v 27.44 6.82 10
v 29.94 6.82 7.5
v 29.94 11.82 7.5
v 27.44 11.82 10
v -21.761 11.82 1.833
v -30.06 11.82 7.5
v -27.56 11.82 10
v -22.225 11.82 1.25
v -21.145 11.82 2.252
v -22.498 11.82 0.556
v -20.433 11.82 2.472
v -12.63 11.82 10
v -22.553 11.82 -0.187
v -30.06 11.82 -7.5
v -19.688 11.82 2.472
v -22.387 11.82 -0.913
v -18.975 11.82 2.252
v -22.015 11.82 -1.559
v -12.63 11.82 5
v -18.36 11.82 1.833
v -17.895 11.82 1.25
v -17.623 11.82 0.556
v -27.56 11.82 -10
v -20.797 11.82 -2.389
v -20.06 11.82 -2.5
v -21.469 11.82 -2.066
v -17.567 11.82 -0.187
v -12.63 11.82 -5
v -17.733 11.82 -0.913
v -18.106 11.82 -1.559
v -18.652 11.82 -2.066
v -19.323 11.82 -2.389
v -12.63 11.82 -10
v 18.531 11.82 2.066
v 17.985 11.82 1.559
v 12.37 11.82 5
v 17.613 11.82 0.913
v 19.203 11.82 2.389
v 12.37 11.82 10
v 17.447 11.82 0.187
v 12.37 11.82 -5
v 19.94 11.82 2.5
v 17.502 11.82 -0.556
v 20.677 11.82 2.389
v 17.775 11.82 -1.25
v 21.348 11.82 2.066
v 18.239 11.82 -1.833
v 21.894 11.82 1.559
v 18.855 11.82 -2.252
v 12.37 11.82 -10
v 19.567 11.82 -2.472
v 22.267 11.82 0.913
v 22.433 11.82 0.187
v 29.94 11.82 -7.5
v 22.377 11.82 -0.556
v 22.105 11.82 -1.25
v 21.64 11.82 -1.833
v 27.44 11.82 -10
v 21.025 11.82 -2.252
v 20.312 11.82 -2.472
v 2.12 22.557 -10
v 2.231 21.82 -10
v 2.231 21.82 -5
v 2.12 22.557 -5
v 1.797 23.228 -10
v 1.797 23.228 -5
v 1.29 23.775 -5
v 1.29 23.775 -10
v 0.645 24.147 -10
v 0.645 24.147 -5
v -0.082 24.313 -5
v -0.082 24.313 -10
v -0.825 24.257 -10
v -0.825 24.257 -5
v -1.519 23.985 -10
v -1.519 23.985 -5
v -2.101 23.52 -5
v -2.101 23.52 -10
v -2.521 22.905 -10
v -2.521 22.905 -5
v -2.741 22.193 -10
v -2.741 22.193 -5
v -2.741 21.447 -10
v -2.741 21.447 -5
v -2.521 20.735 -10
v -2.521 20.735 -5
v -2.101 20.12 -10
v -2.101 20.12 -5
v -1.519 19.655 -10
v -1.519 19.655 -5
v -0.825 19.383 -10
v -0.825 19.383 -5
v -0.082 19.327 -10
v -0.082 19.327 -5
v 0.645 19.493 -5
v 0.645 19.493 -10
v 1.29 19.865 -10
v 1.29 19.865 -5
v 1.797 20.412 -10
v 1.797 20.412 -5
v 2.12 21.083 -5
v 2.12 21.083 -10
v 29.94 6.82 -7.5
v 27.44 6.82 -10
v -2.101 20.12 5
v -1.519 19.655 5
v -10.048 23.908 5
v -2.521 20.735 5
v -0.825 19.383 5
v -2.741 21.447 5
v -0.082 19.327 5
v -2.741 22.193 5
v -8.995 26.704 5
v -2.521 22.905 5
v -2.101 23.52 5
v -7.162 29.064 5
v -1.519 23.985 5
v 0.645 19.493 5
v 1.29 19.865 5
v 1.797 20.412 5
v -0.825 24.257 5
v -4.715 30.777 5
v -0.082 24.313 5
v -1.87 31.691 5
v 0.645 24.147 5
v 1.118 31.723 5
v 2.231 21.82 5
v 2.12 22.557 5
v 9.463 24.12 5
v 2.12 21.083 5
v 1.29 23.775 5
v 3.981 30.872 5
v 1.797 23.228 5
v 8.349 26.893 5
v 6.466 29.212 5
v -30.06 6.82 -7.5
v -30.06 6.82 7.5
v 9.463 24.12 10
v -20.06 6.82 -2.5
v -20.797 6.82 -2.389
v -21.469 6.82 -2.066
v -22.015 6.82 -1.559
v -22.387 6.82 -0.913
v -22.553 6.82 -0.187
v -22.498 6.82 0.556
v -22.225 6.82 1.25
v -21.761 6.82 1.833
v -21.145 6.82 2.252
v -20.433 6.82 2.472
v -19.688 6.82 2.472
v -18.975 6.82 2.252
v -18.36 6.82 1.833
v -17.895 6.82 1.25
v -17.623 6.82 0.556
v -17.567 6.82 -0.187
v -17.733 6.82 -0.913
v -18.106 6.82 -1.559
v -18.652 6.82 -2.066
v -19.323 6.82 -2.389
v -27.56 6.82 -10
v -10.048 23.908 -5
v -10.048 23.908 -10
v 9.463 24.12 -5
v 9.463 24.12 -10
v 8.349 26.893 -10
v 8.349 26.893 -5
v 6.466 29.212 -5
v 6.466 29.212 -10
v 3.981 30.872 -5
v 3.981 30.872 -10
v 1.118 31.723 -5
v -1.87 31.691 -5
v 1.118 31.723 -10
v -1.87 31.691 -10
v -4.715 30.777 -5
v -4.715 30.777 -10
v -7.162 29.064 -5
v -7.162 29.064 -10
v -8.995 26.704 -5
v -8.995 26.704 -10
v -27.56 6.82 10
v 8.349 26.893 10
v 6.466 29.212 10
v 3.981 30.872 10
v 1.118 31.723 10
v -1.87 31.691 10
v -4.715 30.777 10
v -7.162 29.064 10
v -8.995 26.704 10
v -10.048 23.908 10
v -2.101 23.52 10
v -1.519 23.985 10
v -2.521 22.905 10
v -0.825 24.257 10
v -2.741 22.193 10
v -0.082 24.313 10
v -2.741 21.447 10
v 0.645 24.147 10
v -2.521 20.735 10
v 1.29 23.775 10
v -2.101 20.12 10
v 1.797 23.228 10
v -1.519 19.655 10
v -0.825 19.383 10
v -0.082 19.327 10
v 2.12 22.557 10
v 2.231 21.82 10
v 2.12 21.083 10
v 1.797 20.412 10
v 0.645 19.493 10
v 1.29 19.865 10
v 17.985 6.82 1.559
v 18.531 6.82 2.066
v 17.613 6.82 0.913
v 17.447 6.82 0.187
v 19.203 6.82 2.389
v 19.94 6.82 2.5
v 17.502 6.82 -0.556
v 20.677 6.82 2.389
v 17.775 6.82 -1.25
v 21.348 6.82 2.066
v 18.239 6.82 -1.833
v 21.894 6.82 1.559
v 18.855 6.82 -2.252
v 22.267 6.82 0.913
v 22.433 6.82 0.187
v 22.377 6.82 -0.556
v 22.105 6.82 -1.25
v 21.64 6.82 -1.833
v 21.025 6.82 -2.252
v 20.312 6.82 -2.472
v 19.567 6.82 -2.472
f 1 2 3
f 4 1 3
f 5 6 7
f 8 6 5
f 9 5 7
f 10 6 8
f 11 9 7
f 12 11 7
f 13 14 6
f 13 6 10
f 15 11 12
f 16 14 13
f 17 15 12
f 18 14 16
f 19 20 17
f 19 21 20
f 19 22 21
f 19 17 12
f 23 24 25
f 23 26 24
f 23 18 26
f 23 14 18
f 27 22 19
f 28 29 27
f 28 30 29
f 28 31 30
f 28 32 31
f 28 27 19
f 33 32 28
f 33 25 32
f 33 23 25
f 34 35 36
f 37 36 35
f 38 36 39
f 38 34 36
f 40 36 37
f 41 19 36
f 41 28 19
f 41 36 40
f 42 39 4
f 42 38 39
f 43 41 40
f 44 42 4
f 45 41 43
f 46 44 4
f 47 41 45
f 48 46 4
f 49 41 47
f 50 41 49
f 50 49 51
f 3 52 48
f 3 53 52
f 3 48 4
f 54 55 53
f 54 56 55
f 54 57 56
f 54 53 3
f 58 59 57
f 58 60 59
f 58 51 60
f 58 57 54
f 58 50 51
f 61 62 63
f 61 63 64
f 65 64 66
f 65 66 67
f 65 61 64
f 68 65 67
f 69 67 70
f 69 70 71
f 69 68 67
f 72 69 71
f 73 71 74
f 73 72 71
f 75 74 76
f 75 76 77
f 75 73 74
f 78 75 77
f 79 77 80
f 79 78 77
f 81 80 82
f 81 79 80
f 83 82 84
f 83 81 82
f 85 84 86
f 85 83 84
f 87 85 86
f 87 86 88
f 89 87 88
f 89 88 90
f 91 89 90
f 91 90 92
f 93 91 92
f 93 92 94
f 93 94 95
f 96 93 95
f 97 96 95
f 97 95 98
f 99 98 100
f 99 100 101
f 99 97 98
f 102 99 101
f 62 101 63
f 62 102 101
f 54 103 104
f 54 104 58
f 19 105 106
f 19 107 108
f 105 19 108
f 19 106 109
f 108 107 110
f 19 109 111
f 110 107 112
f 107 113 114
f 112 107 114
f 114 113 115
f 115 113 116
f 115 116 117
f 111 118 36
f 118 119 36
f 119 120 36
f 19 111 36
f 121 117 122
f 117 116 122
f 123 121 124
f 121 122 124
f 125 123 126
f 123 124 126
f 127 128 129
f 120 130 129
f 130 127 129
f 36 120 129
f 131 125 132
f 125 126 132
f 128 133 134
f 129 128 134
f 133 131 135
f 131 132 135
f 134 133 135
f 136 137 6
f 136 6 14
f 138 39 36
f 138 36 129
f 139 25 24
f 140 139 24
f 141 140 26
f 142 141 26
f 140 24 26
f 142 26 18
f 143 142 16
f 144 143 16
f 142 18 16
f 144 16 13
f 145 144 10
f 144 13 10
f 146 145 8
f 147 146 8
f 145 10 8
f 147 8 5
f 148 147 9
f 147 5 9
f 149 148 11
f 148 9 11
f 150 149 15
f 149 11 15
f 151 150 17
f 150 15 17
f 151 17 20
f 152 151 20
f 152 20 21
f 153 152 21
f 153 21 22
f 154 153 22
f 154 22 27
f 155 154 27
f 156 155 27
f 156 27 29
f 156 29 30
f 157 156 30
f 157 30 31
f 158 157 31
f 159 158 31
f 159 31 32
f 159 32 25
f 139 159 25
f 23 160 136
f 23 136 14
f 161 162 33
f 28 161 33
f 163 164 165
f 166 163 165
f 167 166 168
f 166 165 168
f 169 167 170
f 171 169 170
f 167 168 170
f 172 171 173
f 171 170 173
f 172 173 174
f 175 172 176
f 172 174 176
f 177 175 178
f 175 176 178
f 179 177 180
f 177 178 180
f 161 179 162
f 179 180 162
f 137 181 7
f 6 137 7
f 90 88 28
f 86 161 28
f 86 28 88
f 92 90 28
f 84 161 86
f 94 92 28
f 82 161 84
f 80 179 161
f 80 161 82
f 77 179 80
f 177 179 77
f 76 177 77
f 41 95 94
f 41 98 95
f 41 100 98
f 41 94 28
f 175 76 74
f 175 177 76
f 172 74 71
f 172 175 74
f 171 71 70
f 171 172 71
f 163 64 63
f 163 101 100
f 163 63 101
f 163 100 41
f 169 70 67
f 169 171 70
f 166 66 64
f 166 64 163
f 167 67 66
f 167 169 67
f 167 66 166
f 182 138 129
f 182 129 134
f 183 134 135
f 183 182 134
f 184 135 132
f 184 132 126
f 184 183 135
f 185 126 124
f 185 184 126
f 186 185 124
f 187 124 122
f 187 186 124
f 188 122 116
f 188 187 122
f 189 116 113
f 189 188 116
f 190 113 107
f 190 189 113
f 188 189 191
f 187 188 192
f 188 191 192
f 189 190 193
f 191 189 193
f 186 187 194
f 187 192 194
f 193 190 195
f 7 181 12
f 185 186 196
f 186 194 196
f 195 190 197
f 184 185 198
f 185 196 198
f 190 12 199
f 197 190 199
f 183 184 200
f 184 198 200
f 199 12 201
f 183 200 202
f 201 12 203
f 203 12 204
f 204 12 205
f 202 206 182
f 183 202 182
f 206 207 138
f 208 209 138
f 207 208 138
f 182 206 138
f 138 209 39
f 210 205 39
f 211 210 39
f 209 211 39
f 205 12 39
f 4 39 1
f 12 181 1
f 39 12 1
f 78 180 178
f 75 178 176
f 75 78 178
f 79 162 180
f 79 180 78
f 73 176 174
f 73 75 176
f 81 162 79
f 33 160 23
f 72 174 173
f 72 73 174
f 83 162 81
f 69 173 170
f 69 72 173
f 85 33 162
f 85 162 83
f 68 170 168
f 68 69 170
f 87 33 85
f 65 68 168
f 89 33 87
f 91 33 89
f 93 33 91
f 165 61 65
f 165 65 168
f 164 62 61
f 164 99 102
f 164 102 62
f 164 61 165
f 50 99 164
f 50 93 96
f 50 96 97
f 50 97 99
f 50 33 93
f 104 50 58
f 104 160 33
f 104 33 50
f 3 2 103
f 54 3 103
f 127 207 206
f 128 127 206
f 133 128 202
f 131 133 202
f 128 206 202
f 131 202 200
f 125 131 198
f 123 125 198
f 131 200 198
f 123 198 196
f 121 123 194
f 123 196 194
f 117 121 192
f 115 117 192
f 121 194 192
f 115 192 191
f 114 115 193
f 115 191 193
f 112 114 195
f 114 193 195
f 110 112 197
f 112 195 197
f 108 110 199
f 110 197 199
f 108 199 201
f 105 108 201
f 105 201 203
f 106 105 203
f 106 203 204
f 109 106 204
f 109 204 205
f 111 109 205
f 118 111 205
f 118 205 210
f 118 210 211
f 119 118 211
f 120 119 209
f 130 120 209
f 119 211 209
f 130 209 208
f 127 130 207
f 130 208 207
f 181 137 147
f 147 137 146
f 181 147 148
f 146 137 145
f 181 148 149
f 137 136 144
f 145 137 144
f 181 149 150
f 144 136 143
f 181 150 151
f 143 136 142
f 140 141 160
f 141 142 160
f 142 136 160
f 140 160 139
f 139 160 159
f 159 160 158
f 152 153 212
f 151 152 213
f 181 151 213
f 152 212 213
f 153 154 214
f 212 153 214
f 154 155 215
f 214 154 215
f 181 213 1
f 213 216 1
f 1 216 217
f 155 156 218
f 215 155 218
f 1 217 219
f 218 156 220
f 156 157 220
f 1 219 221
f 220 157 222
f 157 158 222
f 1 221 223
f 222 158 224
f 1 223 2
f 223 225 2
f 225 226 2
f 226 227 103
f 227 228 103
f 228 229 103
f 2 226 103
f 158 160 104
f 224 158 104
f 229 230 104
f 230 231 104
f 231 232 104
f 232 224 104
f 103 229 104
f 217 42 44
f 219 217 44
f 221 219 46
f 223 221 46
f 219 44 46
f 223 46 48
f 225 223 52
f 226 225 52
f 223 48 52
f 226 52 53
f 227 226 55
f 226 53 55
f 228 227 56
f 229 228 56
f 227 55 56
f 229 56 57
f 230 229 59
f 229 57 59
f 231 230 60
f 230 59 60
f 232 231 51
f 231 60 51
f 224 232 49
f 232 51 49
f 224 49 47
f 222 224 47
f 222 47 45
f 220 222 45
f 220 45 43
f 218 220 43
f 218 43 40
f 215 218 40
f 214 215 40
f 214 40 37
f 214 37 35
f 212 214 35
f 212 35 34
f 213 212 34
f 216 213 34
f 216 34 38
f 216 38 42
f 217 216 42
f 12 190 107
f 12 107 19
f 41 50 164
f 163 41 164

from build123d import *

# Parameters (mm, degrees)
SKETCH1_W           = 120
SKETCH1_H           = 40
BOSS_EXTRUDE1_DEPTH = 10
SKETCH2_R           = 5
BOSS_EXTRUDE2_DEPTH = 10
CHAMFER1_SIZE       = 5
SKETCH3_R           = 5
CUT_EXTRUDE1_DEPTH  = 75.833147735
SCALE2_SCALE        = 0.5


with BuildPart() as part:
    # Sketch1 → Boss-Extrude1 (new body)
    with BuildSketch(Plane(origin=(0, 0, 0), x_dir=(1, 0, 0), z_dir=(0, 1, 0))):
        Rectangle(SKETCH1_W, SKETCH1_H)
    extrude(amount=BOSS_EXTRUDE1_DEPTH)

    # Sketch2 → Boss-Extrude2 (add)
    with BuildSketch(Plane.XY.offset(20)):
        with BuildLine():
            Line((-19.976236617, 34.176742213), (-25.139075945, 10))
            Line((-25.139075945, 10), (24.860924055, 10))
            Line((24.860924055, 10), (19.046500931, 34.600354606))
            ThreePointArc((19.046500931, 34.600354606), (-0.634325591, 49.998821679), (-19.976236617, 34.176742213))
        make_face()
        with Locations((-0.417227836, 30)):
            Circle(SKETCH2_R, mode=Mode.SUBTRACT)
    boss_extrude2 = extrude(amount=-BOSS_EXTRUDE2_DEPTH)

    # Mirror1: Boss-Extrude2 across plane
    add(boss_extrude2.mirror(Plane.XY))

    # Chamfer1
    chamfer1_edges = [part.edges().sort_by_distance(p)[0] for p in [
        (-60, 5, -20),
        (60, 5, -20),
        (60, 5, 20),
        (-60, 5, 20),
    ]]
    chamfer(chamfer1_edges, length=CHAMFER1_SIZE)

    # Sketch3 → Cut-Extrude1 (cut, through all)
    with BuildSketch(Plane(origin=(0, 10, 0), x_dir=(1, 0, 0), z_dir=(0, 1, 0))):
        with Locations(Location((40, 0, 0), (0, 0, 270))):
            Circle(SKETCH3_R)
        with Locations(Location((-40, 0, 0), (0, 0, 90))):
            Circle(SKETCH3_R)
    extrude(amount=-CUT_EXTRUDE1_DEPTH, mode=Mode.SUBTRACT)


with BuildPart() as part_1:
    # Scale2: scaled about (-0.120416424, 13.6400035, 0)
    add(part.part.scale(SCALE2_SCALE).moved(Location((-0.060208212, 6.82000175, 0))))


solid = part_1.part
